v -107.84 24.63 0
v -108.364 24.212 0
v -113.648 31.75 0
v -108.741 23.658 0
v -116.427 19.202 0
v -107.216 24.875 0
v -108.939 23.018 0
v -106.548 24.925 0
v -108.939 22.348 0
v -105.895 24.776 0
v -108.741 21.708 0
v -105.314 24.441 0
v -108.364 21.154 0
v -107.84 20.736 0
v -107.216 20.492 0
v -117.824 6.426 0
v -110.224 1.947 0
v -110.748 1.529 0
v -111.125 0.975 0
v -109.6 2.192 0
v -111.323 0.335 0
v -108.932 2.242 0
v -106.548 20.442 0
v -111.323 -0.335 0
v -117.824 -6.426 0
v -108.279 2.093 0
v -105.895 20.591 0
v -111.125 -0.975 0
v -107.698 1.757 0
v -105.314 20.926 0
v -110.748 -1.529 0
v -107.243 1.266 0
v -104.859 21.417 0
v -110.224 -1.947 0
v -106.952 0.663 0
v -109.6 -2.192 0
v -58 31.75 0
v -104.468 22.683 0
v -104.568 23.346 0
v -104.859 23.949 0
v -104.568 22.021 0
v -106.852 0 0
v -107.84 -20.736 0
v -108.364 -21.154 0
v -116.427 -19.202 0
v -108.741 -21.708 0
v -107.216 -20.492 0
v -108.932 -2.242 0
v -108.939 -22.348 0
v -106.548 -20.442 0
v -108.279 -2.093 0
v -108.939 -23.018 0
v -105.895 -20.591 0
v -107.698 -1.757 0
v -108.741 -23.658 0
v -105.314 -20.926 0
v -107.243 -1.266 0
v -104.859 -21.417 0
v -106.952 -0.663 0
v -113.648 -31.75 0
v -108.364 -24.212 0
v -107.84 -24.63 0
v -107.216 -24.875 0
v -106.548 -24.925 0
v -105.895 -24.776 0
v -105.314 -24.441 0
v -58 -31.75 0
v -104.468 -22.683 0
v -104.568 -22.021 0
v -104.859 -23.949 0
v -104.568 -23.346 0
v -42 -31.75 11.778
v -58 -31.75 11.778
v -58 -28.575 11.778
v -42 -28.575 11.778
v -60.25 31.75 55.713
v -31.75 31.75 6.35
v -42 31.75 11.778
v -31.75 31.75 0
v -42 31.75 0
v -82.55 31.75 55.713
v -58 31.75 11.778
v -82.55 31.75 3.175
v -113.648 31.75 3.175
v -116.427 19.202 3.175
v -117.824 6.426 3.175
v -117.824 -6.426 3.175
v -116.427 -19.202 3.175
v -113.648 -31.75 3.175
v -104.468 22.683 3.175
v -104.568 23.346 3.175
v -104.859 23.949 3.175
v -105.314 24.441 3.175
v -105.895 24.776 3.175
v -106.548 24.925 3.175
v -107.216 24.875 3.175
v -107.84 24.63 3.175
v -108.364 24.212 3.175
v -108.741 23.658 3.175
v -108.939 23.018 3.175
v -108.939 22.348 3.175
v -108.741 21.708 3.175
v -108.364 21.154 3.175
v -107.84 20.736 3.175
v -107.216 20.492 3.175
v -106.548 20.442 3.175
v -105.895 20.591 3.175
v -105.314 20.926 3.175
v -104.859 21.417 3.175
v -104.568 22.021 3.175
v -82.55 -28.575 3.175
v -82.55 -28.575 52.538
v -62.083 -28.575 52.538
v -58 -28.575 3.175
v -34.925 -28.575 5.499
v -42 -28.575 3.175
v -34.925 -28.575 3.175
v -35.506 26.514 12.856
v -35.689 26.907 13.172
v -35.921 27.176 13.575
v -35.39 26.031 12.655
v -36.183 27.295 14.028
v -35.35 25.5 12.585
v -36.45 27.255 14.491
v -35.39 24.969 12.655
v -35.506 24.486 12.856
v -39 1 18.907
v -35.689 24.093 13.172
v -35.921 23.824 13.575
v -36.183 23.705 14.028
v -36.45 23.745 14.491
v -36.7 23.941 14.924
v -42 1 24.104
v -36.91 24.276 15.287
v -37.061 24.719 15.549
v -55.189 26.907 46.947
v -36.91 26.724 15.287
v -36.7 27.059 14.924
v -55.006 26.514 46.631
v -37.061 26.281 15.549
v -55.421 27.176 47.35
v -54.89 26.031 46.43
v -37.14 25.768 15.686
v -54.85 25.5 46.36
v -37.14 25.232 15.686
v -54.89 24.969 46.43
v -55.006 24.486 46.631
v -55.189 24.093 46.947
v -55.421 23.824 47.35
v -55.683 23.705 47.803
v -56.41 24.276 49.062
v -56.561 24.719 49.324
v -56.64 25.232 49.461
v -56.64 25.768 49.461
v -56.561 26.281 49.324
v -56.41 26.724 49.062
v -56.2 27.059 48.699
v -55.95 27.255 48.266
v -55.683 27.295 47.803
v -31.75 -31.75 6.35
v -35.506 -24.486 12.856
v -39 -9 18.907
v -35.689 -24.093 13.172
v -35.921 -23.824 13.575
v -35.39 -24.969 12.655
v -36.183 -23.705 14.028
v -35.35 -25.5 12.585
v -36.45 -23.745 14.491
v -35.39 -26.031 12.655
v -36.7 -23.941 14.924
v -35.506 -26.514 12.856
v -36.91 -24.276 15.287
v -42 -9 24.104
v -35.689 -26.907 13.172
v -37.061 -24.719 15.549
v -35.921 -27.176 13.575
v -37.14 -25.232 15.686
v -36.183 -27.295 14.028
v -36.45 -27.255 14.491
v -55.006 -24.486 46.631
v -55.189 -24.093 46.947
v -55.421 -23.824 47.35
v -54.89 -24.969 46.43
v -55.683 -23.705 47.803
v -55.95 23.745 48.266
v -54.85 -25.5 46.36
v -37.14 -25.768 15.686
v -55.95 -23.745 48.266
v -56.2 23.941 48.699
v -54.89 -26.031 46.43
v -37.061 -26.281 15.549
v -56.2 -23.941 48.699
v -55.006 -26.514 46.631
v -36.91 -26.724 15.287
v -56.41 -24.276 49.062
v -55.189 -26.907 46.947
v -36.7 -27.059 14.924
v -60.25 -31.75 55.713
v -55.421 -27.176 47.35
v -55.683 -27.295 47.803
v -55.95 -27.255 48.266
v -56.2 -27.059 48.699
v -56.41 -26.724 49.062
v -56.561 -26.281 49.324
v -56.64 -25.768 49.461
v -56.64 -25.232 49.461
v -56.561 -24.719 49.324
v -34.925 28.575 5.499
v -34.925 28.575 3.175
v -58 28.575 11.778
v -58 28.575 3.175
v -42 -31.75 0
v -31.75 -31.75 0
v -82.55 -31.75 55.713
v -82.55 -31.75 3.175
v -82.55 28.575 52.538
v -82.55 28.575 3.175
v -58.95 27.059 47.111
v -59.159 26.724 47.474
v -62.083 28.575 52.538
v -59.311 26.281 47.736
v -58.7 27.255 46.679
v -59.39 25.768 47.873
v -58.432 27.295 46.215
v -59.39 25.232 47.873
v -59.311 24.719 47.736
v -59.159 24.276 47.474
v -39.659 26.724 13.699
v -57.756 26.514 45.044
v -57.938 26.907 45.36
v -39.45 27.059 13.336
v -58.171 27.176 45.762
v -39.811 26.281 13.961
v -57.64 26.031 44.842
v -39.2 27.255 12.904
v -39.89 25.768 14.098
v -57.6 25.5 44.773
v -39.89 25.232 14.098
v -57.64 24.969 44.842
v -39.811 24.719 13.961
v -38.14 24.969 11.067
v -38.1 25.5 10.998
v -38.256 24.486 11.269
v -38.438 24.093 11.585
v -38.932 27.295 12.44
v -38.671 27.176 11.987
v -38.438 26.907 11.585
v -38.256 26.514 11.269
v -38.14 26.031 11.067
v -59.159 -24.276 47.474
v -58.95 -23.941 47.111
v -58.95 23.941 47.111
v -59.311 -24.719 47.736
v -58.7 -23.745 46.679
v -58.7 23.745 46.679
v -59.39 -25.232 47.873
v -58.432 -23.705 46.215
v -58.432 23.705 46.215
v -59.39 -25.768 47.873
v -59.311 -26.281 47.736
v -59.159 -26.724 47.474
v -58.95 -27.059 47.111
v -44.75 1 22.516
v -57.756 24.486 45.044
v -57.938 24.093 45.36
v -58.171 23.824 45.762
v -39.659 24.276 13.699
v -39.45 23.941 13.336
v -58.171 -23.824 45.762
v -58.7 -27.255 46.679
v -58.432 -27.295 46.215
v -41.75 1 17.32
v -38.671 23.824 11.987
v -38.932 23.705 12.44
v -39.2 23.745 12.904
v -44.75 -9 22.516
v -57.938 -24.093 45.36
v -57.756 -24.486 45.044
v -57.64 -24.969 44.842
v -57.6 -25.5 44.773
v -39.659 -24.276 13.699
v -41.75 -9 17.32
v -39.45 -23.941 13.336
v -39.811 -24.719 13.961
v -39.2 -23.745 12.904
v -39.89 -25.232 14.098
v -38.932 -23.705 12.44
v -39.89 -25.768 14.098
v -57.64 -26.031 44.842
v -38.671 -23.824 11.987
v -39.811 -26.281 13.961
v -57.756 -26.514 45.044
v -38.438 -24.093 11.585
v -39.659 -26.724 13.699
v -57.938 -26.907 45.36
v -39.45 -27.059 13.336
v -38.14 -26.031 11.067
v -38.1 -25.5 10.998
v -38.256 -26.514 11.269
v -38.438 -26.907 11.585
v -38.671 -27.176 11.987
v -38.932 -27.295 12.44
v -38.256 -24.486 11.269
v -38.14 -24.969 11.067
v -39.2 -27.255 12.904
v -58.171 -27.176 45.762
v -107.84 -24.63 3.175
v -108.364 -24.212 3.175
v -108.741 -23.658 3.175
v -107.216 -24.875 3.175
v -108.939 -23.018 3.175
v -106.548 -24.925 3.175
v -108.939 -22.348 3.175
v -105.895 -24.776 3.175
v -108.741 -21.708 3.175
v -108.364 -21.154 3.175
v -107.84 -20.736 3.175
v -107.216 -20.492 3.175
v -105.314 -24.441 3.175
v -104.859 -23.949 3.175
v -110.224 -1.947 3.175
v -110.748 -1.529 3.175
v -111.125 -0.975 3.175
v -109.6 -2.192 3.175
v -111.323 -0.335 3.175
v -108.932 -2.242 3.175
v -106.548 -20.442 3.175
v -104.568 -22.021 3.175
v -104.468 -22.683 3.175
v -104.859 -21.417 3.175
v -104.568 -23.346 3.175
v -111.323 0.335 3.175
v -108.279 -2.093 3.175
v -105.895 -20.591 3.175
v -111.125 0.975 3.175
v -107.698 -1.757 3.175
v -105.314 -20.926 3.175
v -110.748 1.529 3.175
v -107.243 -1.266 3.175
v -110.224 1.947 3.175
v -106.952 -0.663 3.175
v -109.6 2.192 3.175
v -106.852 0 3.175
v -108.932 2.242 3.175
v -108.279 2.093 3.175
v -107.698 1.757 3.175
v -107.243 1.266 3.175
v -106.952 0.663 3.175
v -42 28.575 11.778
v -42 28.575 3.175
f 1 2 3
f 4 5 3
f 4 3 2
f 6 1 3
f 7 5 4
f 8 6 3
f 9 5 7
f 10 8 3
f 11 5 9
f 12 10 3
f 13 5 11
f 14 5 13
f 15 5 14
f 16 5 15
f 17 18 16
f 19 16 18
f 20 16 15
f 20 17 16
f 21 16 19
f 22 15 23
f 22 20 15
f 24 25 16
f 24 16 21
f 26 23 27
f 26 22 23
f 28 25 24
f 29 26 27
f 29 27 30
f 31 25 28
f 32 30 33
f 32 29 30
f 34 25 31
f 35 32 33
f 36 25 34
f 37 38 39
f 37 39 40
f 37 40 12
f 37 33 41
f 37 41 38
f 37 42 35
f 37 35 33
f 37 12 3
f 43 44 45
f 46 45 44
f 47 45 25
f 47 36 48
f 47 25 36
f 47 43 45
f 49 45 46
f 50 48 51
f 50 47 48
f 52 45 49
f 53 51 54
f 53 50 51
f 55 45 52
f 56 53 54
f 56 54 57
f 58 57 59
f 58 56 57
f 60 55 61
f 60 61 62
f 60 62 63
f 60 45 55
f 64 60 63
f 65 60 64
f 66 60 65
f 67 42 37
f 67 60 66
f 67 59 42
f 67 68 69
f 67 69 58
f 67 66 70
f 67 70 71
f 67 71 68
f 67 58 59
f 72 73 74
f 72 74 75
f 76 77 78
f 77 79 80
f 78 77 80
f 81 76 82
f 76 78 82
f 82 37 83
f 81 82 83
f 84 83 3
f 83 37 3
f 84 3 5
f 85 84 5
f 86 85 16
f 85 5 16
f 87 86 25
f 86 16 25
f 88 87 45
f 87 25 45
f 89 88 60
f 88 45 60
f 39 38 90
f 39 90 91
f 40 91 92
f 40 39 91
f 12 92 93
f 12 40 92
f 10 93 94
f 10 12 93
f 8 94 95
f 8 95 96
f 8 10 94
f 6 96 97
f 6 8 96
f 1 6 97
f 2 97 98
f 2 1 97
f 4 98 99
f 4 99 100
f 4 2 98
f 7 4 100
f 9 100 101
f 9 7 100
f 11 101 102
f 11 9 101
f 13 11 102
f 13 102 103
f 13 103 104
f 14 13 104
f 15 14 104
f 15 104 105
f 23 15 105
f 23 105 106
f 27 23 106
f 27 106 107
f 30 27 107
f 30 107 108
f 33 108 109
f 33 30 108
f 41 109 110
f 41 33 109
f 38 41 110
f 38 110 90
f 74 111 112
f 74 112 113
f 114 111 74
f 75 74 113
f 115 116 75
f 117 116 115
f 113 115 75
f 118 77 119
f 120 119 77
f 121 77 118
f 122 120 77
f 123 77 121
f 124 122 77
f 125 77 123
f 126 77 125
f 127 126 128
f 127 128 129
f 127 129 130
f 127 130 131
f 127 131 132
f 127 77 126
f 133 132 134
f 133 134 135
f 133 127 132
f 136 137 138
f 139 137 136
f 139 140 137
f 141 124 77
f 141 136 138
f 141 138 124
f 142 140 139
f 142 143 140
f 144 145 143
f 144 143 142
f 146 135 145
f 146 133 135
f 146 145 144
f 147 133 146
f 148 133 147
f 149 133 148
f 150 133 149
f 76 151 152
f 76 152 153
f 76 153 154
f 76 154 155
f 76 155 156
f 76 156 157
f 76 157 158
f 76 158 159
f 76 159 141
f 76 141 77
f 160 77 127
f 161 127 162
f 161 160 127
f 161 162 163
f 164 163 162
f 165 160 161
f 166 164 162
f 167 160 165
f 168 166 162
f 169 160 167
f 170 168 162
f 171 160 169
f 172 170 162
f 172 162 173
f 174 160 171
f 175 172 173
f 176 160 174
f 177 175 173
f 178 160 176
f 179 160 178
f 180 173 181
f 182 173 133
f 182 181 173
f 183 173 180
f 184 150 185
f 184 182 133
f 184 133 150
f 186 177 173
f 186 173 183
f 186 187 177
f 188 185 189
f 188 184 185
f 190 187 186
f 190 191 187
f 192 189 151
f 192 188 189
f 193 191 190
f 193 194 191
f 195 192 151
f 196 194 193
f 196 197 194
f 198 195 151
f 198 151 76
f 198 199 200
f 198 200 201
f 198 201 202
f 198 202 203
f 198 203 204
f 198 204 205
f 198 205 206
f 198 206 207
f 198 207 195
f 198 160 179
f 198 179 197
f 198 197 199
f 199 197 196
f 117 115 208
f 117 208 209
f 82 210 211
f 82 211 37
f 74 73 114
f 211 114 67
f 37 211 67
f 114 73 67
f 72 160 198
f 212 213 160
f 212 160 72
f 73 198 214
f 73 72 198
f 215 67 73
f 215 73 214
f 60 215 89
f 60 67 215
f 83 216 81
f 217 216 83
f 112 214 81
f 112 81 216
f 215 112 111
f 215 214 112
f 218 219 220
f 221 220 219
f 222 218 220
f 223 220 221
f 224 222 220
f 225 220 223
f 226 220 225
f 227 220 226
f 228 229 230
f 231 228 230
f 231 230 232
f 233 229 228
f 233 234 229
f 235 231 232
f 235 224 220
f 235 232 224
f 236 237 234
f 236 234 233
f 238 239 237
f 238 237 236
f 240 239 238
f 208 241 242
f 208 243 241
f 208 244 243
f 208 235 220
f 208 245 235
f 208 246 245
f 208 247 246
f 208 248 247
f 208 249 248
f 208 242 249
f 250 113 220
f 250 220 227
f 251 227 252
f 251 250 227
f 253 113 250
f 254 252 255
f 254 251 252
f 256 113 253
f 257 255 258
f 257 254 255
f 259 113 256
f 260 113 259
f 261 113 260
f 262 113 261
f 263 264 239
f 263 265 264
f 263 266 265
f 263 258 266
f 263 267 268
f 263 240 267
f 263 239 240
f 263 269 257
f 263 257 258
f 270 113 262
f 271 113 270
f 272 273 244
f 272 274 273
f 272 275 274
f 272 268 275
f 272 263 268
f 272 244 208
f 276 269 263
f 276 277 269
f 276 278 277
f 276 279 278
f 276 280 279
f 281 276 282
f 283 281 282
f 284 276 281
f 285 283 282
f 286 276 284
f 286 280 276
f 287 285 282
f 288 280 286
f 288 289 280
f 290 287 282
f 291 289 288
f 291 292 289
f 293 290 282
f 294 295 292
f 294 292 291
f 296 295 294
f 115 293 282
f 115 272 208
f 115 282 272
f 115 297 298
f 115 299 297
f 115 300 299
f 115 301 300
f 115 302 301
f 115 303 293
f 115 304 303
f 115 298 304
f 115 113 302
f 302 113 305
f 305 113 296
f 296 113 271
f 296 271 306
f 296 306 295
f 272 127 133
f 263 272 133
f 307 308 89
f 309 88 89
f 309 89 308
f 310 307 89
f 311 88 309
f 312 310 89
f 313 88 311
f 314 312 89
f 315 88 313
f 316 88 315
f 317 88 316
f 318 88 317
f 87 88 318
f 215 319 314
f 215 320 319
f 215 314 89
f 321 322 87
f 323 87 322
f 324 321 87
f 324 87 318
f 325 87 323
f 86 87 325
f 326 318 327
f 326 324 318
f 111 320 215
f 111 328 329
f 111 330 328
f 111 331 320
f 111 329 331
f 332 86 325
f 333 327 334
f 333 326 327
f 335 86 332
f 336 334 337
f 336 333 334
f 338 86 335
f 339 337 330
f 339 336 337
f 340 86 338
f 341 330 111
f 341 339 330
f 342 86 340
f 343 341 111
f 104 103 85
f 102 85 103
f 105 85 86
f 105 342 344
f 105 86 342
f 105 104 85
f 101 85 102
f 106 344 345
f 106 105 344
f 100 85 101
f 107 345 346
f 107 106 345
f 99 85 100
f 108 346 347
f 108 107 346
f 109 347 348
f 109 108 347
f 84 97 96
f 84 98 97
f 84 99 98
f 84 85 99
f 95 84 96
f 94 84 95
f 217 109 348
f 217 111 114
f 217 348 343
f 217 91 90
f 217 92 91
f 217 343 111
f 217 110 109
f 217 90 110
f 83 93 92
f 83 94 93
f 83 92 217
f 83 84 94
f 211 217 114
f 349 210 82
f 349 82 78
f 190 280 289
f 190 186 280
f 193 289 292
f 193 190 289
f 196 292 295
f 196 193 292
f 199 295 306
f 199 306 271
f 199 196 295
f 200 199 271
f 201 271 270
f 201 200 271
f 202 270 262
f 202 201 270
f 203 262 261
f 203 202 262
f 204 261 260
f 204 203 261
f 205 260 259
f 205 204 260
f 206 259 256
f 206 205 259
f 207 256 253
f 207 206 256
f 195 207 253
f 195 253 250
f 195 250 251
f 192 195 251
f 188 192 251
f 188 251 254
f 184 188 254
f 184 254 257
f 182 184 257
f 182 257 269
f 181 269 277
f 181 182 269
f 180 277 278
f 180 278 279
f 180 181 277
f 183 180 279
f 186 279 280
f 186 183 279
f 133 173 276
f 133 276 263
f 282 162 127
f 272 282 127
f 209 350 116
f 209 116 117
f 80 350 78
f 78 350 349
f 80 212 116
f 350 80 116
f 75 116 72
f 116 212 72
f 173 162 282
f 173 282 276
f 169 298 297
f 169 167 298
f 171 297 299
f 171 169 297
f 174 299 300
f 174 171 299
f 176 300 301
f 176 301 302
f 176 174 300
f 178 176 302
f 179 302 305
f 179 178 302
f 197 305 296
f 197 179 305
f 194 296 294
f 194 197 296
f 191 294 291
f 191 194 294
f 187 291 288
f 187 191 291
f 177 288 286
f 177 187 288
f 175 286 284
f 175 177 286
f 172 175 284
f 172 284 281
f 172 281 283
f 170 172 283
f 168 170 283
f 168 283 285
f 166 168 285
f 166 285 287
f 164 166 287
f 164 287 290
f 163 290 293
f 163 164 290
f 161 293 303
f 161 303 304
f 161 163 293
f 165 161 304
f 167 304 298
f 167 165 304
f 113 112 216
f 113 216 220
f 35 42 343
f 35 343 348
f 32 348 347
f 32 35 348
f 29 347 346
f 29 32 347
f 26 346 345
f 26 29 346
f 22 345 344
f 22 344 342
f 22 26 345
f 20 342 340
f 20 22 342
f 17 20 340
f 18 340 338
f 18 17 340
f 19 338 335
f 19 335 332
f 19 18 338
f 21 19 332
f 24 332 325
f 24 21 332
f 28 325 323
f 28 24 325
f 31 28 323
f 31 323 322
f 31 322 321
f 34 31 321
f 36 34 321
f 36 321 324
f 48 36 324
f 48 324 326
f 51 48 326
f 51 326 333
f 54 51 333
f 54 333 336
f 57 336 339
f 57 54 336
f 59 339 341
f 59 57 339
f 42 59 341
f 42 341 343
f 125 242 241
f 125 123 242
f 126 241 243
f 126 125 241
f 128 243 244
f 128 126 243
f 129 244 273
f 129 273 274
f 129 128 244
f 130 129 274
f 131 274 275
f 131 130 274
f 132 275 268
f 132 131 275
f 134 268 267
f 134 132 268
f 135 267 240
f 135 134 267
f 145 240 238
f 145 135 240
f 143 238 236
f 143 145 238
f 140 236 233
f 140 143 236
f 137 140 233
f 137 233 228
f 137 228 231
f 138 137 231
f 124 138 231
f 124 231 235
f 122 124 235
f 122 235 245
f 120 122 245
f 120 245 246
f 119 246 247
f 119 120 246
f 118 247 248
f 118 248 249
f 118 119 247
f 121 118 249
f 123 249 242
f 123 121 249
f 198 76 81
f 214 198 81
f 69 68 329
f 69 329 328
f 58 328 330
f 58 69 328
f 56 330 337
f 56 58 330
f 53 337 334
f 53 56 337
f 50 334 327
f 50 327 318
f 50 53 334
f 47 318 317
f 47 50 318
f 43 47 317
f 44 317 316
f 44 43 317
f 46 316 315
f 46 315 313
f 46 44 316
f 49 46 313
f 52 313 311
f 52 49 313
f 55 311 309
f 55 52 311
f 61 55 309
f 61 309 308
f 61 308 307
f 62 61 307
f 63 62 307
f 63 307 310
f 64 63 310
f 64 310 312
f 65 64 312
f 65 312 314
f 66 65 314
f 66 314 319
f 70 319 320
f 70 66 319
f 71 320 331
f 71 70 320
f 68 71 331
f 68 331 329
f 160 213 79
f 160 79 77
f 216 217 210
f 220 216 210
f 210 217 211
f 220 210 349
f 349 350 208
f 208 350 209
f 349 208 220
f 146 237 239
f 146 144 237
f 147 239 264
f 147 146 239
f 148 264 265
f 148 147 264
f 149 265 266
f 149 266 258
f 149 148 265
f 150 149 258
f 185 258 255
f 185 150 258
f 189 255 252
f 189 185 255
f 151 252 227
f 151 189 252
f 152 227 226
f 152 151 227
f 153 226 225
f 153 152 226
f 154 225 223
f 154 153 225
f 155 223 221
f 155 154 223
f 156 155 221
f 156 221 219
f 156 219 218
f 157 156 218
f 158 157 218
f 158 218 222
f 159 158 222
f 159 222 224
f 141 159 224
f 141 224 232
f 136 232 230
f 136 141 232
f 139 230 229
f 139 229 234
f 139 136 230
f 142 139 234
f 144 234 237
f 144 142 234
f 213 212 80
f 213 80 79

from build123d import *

# Parameters (mm, degrees)
BOSS_EXTRUDE5_DEPTH            = 31.75
BOSS_EXTRUDE5_DEPTH_BACK       = 31.75
SKETCH1_R                      = 2.2479
BOSS_EXTRUDE6_DEPTH            = 3.175
SHELL2_START                   = -28.575
SHELL2_DEPTH                   = 57.15
F_1_0MM_DOWEL_HOLE1_AT_2_COUNT = 2
F_1_0MM_DOWEL_HOLE1_AT_2_PITCH = 51
F_1_0MM_DOWEL_HOLE1_AT_3_COUNT = 2
F_1_0MM_DOWEL_HOLE1_AT_3_PITCH = 64.202803677
F_1_0MM_DOWEL_HOLE1_AT_4_COUNT = 2
F_1_0MM_DOWEL_HOLE1_AT_4_PITCH = 39
SKETCH9_W                      = 16
SKETCH9_H                      = 9.25
SKETCH9_H_2                    = 2.52847891
CUT_EXTRUDE1_DEPTH             = 146.121062048
SKETCH10_W                     = 6
SKETCH10_H                     = 10
CUT_EXTRUDE2_DEPTH             = 3.175


# Read off the part's stored shape, not the designer's step: Shell2
with BuildPart() as part:
    # Sketch5 → Boss-Extrude5 (new, two sides: drawn at the far end of the back side and taken through both)
    with BuildSketch(Plane(origin=(0, 0, 0), x_dir=(1, 0, 0), z_dir=(0, 1, 0)).offset(-BOSS_EXTRUDE5_DEPTH_BACK)):
        Polygon((-31.75, 0), (-31.75, -6.35), (-60.25, -55.713448016), (-82.55, -55.713448016), (-82.55, 0), align=None)
    extrude(amount=BOSS_EXTRUDE5_DEPTH + BOSS_EXTRUDE5_DEPTH_BACK)

    # Sketch1 → Boss-Extrude6 (add)
    with BuildSketch(Plane.XY):
        with BuildLine():
            Line((-31.75, 31.75), (-113.647797428, 31.75))
            ThreePointArc((-113.647797428, 31.75), (-117.99951, 0), (-113.647797428, -31.75))
            Line((-113.647797428, -31.75), (-31.75, -31.75))
            Line((-31.75, -31.75), (-31.75, 31.75))
        make_face()
        with Locations((-106.71590324, -22.683165468)):
            Circle(SKETCH1_R, mode=Mode.SUBTRACT)
        with Locations((-109.1, 0)):
            Circle(SKETCH1_R, mode=Mode.SUBTRACT)
        with Locations((-106.71590324, 22.683165468)):
            Circle(SKETCH1_R, mode=Mode.SUBTRACT)
    extrude(amount=BOSS_EXTRUDE6_DEPTH)

    # Shell2 outline → Shell2 (cut)
    with BuildSketch(Plane(origin=(0, 0, 0), x_dir=(1, 0, 0), z_dir=(0, 1, 0)).offset(SHELL2_START)):
        Polygon((-34.925, -3.175), (-82.55, -3.175), (-82.55, -52.538448016), (-62.083087105, -52.538448016), (-34.925, -5.499261314), align=None)
    extrude(amount=SHELL2_DEPTH, mode=Mode.SUBTRACT)

    # Sketch8 → Ø1.0mm Dowel Hole1 (revolve, cut)
    with BuildSketch(Plane(origin=(-55.75, -25.5, 47.919219382), x_dir=(0.4999999999999977, 0, -0.86602540378444), z_dir=(0, 1, 0))):
        Polygon((0, 0), (0, 4.256549114), (1.8, 3.175), (1.8, 0), align=None)
    f_1_0mm_dowel_hole1 = revolve(axis=Axis((-50.250738686, -25.5, 51.094219382), (-0.86602540378444, 0, -0.4999999999999977)), mode=Mode.SUBTRACT)

    # Ø1.0mm Dowel Hole1 at 2: Ø1.0mm Dowel Hole1 ×2
    with Locations(*[(0, i * F_1_0MM_DOWEL_HOLE1_AT_2_PITCH, 0) for i in range(1, F_1_0MM_DOWEL_HOLE1_AT_2_COUNT)]):
        add(f_1_0mm_dowel_hole1, mode=Mode.SUBTRACT)

    # Ø1.0mm Dowel Hole1 at 3: Ø1.0mm Dowel Hole1 ×2
    with Locations(*[Vector(0.3037250537853972, 0.7943578329771961, -0.5260672246879011) * (i * F_1_0MM_DOWEL_HOLE1_AT_3_PITCH) for i in range(1, F_1_0MM_DOWEL_HOLE1_AT_3_COUNT)]):
        add(f_1_0mm_dowel_hole1, mode=Mode.SUBTRACT)

    # Ø1.0mm Dowel Hole1 at 4: Ø1.0mm Dowel Hole1 ×2
    with Locations(*[Vector(0.49999999999999767, 0, -0.86602540378444) * (i * F_1_0MM_DOWEL_HOLE1_AT_4_PITCH) for i in range(1, F_1_0MM_DOWEL_HOLE1_AT_4_COUNT)]):
        add(f_1_0mm_dowel_hole1, mode=Mode.SUBTRACT)

    # Sketch9 → Cut-Extrude1 (cut, through all)
    with BuildSketch(Plane.XZ.offset(31.75)):
        with Locations((-50, 4.625)):
            Rectangle(SKETCH9_W, SKETCH9_H)
        with Locations((-50, 10.514239455)):
            Rectangle(SKETCH9_W, SKETCH9_H_2)
    extrude(amount=-CUT_EXTRUDE1_DEPTH, mode=Mode.SUBTRACT)

    # Sketch10 → Cut-Extrude2 (cut)
    with BuildSketch(Plane(origin=(-21.062869343, 0, -12.160653285), x_dir=(-0.4999999999999977, 0, 0.8660254037844399), z_dir=(-0.8660254037844399, 0, -0.4999999999999977))):
        with Locations((38.874261314, -4)):
            Rectangle(SKETCH10_W, SKETCH10_H)
    extrude(amount=CUT_EXTRUDE2_DEPTH, mode=Mode.SUBTRACT)


solid = part.part
